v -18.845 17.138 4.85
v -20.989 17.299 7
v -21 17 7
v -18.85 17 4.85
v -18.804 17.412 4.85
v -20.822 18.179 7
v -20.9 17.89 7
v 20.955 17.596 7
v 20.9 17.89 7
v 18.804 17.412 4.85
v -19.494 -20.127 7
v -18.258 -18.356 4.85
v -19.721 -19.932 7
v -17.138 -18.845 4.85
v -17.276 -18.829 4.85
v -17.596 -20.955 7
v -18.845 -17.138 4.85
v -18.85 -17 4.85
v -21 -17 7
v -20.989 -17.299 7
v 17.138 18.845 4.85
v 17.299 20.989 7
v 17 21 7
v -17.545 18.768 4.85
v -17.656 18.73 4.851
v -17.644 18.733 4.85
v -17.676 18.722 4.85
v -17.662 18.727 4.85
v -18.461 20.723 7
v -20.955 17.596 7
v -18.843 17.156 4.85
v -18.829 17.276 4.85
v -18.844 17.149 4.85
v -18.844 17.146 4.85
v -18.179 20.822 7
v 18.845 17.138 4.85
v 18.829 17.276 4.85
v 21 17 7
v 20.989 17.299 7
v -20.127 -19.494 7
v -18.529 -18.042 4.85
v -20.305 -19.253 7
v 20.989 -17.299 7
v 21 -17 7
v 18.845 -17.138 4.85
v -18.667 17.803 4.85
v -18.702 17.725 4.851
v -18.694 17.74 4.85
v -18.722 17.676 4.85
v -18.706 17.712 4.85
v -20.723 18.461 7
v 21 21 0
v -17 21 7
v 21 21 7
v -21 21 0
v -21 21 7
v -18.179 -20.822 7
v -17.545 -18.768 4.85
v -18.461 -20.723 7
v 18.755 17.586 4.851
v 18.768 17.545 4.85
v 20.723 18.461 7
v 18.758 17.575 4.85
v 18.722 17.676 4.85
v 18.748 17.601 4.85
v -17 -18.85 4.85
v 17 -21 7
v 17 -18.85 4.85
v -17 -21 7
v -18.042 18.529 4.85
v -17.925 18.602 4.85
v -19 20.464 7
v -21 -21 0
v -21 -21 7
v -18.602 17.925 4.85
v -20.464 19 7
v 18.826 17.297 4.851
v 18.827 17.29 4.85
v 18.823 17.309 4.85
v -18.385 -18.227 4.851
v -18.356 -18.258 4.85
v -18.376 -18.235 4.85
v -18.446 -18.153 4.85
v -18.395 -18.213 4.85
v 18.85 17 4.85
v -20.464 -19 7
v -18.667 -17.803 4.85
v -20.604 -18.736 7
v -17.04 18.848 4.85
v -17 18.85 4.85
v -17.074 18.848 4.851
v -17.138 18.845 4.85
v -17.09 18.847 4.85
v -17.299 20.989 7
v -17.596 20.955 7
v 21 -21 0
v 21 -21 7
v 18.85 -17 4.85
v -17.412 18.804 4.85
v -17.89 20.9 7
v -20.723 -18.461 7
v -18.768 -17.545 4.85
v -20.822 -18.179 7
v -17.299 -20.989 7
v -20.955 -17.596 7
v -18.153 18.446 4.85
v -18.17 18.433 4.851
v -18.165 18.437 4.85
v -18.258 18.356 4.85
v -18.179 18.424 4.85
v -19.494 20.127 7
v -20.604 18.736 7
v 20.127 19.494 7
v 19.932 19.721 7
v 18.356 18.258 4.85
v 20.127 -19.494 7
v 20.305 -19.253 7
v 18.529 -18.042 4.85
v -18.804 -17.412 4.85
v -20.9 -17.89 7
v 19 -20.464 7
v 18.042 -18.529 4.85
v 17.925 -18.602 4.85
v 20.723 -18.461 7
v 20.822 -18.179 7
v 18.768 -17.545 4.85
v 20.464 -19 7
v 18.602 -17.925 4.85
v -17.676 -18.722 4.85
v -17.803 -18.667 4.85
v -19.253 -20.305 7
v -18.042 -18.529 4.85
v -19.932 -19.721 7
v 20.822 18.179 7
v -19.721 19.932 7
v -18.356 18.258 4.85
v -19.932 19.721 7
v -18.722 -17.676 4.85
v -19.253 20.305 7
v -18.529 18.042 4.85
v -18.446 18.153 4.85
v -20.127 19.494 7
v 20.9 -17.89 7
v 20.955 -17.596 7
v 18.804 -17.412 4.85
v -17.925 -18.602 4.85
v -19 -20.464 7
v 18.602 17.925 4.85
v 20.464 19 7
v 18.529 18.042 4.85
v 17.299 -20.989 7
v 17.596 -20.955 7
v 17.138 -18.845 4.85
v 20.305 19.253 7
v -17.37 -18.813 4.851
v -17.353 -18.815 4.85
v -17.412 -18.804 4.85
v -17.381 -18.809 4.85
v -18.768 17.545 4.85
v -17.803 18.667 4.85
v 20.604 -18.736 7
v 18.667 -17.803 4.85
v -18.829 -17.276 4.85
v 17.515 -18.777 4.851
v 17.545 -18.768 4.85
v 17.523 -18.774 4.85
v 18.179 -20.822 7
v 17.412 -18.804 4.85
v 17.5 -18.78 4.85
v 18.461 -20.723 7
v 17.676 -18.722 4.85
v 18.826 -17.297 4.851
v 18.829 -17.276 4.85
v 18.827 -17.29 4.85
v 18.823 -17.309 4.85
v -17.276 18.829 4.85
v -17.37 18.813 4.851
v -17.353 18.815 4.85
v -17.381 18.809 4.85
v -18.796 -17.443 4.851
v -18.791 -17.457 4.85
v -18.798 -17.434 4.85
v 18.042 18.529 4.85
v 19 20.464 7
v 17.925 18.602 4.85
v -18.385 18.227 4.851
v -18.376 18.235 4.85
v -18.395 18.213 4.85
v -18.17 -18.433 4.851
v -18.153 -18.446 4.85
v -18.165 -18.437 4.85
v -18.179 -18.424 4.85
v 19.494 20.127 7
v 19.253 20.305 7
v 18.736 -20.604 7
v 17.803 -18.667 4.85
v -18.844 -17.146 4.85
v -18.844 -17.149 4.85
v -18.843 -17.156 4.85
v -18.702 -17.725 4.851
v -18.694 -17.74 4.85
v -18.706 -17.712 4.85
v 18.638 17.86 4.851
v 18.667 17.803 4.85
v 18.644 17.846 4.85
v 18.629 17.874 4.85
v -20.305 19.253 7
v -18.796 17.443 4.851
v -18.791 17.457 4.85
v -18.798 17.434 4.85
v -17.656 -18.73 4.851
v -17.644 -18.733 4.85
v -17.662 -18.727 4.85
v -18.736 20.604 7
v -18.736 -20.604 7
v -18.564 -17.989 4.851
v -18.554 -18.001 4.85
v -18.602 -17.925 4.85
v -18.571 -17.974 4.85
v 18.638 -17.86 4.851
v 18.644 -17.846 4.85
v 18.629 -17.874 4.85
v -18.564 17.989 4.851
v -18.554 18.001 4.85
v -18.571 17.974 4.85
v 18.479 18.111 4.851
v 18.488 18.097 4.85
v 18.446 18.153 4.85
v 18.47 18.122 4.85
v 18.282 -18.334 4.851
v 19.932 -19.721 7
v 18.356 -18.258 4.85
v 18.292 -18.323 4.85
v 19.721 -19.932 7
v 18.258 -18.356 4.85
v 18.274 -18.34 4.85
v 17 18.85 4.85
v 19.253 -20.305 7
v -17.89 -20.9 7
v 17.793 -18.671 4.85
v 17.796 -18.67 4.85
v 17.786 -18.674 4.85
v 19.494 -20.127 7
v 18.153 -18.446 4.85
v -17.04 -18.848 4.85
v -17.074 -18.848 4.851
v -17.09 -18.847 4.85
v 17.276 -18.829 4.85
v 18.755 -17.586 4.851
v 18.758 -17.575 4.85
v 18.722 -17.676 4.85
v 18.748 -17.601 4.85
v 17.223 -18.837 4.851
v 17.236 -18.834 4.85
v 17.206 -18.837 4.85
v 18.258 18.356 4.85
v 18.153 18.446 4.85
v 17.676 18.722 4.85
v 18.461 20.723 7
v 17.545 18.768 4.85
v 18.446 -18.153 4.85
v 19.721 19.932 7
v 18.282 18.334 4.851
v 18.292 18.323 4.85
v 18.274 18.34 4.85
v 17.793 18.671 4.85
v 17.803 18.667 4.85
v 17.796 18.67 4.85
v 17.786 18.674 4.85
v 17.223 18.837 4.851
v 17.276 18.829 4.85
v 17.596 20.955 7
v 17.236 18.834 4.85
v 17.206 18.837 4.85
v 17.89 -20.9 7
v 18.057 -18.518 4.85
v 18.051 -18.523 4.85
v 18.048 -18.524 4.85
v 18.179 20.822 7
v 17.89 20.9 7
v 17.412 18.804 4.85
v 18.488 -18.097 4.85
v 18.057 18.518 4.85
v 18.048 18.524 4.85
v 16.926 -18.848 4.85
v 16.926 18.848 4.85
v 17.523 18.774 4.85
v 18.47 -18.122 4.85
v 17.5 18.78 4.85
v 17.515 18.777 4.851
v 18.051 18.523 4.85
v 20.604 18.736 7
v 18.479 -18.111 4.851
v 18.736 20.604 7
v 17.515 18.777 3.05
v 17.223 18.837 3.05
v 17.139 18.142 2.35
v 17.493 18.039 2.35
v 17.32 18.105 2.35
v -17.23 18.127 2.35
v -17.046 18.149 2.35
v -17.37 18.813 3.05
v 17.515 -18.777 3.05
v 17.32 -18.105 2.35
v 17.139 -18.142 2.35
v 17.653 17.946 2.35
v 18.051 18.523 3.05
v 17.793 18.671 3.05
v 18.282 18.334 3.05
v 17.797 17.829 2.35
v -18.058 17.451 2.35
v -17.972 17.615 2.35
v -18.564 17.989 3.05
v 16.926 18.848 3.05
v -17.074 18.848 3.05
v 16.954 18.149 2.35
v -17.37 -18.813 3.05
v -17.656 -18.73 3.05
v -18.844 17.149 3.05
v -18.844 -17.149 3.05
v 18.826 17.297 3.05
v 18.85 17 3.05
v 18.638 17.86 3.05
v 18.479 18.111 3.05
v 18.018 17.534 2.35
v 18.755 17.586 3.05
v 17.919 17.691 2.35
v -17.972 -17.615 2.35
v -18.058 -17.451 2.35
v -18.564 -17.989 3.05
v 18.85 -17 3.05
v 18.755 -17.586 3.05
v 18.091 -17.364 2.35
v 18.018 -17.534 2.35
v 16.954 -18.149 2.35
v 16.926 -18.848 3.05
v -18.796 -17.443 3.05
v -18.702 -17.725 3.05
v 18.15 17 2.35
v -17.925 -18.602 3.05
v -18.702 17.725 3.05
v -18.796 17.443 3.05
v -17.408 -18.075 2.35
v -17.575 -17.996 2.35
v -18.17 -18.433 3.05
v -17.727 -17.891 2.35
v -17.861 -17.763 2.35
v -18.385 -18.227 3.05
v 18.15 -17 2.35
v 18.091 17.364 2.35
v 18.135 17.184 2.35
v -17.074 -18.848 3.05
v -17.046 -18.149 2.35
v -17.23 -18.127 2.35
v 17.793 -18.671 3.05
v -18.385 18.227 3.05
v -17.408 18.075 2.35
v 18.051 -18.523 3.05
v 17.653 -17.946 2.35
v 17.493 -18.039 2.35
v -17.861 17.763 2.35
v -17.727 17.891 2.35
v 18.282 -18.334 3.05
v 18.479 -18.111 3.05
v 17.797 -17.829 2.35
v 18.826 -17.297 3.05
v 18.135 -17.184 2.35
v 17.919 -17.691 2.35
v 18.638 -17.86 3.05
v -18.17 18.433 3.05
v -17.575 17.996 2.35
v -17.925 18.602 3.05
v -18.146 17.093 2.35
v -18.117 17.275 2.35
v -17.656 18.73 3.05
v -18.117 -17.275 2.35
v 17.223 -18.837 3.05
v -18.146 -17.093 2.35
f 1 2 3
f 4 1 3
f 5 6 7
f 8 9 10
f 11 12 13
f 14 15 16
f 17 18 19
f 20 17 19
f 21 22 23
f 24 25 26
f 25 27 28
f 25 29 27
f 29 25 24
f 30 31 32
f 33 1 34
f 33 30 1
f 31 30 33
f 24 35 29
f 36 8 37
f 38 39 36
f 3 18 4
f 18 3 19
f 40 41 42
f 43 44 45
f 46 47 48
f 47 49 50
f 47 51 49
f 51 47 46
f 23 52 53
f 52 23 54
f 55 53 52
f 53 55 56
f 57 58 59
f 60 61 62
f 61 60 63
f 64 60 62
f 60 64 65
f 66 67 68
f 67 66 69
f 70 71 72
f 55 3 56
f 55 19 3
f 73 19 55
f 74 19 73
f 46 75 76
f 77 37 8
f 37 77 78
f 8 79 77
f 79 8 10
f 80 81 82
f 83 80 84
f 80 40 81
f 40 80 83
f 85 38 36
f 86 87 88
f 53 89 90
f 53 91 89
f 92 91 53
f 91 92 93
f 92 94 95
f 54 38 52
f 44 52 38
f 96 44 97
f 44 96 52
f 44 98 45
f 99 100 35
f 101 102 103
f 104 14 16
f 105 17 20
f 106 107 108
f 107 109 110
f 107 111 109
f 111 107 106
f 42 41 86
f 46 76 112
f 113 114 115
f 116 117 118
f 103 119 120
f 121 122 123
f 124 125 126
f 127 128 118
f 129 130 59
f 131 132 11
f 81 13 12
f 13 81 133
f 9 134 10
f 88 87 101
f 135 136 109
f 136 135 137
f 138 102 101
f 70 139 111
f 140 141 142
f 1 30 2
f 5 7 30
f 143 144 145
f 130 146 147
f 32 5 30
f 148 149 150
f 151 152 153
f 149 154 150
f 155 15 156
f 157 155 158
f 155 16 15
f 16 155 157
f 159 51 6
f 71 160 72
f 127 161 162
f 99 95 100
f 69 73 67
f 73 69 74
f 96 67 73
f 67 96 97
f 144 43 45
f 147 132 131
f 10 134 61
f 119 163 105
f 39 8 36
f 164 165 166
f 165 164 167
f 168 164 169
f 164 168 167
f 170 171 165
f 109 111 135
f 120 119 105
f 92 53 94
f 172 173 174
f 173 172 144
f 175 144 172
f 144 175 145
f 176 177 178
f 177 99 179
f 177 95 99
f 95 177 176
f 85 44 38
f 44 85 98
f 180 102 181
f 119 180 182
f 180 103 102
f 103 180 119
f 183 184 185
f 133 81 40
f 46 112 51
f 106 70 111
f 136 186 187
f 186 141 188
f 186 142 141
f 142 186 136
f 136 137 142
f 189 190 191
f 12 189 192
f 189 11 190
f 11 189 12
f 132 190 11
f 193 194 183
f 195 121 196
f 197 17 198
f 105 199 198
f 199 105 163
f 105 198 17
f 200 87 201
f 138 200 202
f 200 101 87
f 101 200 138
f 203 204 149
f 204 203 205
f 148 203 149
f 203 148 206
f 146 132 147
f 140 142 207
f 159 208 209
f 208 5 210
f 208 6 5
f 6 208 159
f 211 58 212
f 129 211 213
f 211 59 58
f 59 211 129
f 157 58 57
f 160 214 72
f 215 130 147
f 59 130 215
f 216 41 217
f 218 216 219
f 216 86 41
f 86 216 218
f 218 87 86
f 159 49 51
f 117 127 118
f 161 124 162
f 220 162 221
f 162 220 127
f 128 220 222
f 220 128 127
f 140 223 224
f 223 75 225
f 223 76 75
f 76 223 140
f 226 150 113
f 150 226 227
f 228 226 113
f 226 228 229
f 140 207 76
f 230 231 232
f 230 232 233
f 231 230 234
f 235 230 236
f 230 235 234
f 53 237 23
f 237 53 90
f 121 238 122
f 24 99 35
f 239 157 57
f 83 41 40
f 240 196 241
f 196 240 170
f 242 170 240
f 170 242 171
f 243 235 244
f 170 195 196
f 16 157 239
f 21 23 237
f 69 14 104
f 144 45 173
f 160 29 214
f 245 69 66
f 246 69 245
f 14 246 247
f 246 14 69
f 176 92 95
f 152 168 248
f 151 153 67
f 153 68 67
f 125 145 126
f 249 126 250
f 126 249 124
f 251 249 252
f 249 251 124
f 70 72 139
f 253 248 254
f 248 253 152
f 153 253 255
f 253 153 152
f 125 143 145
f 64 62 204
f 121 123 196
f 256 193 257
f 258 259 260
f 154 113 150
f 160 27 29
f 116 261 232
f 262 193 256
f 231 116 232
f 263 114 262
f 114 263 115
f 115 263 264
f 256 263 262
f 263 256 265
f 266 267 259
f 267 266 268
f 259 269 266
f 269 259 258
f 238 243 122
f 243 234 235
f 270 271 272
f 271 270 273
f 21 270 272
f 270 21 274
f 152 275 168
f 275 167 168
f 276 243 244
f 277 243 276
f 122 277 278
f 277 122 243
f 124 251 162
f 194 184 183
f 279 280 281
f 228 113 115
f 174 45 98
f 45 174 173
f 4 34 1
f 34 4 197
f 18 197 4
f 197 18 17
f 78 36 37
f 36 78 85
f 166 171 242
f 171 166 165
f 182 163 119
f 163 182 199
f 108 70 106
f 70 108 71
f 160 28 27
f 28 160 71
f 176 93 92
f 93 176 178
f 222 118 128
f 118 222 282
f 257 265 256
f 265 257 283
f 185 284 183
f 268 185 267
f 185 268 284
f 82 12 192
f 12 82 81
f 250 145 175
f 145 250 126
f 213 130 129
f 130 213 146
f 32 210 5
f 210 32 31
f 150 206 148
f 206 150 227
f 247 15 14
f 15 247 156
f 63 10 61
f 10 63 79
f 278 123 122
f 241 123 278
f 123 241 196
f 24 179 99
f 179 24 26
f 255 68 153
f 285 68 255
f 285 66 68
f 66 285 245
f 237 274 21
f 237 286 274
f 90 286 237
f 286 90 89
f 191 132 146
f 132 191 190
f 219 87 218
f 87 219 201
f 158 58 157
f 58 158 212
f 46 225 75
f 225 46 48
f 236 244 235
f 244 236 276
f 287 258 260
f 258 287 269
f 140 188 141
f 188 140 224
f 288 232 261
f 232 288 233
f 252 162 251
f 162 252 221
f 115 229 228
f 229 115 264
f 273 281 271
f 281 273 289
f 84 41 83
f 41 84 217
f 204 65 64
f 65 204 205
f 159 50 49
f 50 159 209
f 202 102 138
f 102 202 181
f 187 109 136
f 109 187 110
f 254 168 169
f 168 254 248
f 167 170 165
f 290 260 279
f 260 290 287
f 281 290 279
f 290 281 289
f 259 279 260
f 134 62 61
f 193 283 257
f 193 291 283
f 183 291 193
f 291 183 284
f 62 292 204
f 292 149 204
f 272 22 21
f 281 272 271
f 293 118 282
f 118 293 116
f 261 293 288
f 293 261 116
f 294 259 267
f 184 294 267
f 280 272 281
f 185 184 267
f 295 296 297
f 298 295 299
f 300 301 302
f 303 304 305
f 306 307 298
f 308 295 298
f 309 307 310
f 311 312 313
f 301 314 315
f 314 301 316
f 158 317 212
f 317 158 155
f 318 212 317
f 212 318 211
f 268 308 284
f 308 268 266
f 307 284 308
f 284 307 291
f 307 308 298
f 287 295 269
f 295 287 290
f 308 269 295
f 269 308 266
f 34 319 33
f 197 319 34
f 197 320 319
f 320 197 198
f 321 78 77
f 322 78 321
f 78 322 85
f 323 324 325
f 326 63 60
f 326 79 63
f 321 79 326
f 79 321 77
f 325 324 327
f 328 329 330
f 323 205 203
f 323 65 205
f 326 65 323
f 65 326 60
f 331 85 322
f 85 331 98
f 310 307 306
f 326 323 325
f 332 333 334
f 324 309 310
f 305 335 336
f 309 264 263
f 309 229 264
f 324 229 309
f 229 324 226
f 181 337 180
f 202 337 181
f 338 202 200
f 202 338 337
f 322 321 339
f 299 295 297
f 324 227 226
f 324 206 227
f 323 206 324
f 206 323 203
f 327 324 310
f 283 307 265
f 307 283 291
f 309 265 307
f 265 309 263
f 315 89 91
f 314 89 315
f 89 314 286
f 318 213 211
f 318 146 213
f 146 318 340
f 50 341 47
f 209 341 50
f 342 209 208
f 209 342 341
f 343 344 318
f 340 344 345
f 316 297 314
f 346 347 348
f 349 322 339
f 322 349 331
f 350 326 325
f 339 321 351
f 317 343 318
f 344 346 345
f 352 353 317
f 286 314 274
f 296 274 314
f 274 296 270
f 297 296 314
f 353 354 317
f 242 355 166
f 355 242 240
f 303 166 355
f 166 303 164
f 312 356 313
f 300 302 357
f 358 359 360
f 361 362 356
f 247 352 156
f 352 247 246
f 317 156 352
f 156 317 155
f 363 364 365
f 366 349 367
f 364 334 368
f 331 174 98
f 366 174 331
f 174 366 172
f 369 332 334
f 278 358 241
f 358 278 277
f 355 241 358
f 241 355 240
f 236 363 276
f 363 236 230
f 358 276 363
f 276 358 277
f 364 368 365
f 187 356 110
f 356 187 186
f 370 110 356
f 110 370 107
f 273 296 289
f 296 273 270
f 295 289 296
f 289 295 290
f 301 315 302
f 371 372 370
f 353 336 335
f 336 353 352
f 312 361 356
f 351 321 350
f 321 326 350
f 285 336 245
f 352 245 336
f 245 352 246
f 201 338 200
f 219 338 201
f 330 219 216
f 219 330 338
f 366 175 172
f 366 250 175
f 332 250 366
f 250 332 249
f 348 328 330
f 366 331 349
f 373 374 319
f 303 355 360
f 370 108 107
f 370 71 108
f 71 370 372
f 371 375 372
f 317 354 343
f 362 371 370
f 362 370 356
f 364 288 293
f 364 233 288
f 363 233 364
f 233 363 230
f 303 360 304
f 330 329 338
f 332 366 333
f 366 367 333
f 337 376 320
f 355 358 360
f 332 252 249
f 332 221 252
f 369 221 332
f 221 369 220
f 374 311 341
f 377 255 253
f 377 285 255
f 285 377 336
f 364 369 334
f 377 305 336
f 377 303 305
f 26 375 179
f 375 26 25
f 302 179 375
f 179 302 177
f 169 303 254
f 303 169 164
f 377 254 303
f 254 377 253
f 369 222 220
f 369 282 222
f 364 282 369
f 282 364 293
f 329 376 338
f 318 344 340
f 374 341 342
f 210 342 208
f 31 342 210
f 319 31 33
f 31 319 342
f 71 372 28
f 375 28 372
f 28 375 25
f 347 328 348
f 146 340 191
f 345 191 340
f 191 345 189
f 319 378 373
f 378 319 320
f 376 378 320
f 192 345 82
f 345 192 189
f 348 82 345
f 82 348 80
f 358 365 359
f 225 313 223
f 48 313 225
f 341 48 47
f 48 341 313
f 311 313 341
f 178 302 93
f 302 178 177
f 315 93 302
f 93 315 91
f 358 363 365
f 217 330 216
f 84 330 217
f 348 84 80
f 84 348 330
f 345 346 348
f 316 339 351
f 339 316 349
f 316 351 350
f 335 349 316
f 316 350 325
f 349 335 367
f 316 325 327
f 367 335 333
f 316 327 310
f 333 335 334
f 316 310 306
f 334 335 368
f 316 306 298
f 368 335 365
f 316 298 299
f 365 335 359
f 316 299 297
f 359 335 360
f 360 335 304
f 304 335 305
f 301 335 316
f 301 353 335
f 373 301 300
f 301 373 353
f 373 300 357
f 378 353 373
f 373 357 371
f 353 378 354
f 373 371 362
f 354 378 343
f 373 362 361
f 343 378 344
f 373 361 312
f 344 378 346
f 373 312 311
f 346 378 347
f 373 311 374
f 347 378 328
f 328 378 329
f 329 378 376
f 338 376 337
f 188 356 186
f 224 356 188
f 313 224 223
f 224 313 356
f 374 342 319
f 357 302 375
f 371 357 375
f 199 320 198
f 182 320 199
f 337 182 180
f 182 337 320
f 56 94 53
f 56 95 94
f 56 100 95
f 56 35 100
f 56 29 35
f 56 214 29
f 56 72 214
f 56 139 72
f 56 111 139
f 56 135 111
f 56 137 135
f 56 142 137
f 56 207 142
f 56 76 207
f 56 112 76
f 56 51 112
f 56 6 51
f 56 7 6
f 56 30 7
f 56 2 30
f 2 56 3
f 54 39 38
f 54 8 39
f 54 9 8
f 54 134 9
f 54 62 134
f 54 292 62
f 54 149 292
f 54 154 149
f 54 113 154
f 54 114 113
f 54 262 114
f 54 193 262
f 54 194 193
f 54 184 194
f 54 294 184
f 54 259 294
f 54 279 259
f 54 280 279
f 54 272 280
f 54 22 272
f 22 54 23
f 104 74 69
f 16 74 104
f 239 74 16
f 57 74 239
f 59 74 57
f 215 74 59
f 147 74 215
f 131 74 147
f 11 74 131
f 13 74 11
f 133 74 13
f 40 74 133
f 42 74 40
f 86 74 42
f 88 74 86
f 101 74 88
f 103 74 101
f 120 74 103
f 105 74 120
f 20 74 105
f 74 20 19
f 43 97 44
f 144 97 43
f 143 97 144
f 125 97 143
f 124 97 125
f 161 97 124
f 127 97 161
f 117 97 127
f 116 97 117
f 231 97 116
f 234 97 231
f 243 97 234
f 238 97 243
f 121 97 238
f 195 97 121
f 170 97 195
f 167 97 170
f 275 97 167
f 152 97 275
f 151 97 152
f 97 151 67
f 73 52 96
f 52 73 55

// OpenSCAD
// file: baseplate_cell.scad
outer_radius = 4;
top_bevel_height = 2.15;
shelf_height = 1.8;
bottom_bevel_height = 0.7;

shelf_radius = outer_radius - top_bevel_height;
bottom_radius = outer_radius - (top_bevel_height + bottom_bevel_height);
side_length = $pitch[0];

min_height = top_bevel_height + shelf_height + bottom_bevel_height - 0.005;
function get_plate_height() = $pitch.z < min_height ? min_height : $pitch.z;
plate_height = get_plate_height();

module baseplate_cell() {
    difference() {
        outer_profile();
        cavity();
    }
}

module outer_profile() {
    translate([0,0, plate_height/2])
    cube([$pitch.x, $pitch.y, plate_height], center=true);
}

module cavity() {
    union() {
        hull() {
            // extend top to avoid z fighting
            translate([0,0, plate_height]) cap();

            // top bevel
            translate([0, 0, plate_height-top_bevel_height]) top_bevel();
        }

        hull() {
            // shelf
            translate([0, 0, plate_height-top_bevel_height-shelf_height]) shelf();

            // bottom bevel
            translate([0, 0, plate_height-top_bevel_height-shelf_height-bottom_bevel_height]) bottom_bevel();
        }
    }
}

module cap() {
    translate([0, 0, plate_height/2])
    hull()
    cornercopy(d=outer_radius)
    cylinder(h=0.005, r=outer_radius, center=true);
}

module top_bevel() {
    hull()
    cornercopy(d = outer_radius)
    cylinder(r1=shelf_radius, r2=outer_radius, h=top_bevel_height);
}

module shelf() {
    hull()
    cornercopy(d=outer_radius)
    cylinder(h=plate_height/2, r=shelf_radius);
}

module bottom_bevel() {
    hull()
    cornercopy(d = outer_radius)
    cylinder(r1=bottom_radius, r2=shelf_radius, h=bottom_bevel_height);
}

module cornercopy(d) {
    for (xx=[-1, 1], yy=[-1, 1]) {
        xpos = xx * ($pitch.x/2 - d);
        ypos = yy * ($pitch.y/2 - d);
        // echo(xpos, ypos);
        translate([xpos, ypos, 0]) children();
    }
}
// main file
use <./baseplate_cell.scad>

/* [ Global Variables ] */
$fa = 1;
$fs = 0.3;

/* [ Grid Settings ] */
// X, Y, Z. Set Z=0 for min plate height
Pitch = [42, 42, 7];

$pitch = Pitch;

baseplate_cell();
// translate([0, 42, 0]) baseplate_cell();

// cavity();
